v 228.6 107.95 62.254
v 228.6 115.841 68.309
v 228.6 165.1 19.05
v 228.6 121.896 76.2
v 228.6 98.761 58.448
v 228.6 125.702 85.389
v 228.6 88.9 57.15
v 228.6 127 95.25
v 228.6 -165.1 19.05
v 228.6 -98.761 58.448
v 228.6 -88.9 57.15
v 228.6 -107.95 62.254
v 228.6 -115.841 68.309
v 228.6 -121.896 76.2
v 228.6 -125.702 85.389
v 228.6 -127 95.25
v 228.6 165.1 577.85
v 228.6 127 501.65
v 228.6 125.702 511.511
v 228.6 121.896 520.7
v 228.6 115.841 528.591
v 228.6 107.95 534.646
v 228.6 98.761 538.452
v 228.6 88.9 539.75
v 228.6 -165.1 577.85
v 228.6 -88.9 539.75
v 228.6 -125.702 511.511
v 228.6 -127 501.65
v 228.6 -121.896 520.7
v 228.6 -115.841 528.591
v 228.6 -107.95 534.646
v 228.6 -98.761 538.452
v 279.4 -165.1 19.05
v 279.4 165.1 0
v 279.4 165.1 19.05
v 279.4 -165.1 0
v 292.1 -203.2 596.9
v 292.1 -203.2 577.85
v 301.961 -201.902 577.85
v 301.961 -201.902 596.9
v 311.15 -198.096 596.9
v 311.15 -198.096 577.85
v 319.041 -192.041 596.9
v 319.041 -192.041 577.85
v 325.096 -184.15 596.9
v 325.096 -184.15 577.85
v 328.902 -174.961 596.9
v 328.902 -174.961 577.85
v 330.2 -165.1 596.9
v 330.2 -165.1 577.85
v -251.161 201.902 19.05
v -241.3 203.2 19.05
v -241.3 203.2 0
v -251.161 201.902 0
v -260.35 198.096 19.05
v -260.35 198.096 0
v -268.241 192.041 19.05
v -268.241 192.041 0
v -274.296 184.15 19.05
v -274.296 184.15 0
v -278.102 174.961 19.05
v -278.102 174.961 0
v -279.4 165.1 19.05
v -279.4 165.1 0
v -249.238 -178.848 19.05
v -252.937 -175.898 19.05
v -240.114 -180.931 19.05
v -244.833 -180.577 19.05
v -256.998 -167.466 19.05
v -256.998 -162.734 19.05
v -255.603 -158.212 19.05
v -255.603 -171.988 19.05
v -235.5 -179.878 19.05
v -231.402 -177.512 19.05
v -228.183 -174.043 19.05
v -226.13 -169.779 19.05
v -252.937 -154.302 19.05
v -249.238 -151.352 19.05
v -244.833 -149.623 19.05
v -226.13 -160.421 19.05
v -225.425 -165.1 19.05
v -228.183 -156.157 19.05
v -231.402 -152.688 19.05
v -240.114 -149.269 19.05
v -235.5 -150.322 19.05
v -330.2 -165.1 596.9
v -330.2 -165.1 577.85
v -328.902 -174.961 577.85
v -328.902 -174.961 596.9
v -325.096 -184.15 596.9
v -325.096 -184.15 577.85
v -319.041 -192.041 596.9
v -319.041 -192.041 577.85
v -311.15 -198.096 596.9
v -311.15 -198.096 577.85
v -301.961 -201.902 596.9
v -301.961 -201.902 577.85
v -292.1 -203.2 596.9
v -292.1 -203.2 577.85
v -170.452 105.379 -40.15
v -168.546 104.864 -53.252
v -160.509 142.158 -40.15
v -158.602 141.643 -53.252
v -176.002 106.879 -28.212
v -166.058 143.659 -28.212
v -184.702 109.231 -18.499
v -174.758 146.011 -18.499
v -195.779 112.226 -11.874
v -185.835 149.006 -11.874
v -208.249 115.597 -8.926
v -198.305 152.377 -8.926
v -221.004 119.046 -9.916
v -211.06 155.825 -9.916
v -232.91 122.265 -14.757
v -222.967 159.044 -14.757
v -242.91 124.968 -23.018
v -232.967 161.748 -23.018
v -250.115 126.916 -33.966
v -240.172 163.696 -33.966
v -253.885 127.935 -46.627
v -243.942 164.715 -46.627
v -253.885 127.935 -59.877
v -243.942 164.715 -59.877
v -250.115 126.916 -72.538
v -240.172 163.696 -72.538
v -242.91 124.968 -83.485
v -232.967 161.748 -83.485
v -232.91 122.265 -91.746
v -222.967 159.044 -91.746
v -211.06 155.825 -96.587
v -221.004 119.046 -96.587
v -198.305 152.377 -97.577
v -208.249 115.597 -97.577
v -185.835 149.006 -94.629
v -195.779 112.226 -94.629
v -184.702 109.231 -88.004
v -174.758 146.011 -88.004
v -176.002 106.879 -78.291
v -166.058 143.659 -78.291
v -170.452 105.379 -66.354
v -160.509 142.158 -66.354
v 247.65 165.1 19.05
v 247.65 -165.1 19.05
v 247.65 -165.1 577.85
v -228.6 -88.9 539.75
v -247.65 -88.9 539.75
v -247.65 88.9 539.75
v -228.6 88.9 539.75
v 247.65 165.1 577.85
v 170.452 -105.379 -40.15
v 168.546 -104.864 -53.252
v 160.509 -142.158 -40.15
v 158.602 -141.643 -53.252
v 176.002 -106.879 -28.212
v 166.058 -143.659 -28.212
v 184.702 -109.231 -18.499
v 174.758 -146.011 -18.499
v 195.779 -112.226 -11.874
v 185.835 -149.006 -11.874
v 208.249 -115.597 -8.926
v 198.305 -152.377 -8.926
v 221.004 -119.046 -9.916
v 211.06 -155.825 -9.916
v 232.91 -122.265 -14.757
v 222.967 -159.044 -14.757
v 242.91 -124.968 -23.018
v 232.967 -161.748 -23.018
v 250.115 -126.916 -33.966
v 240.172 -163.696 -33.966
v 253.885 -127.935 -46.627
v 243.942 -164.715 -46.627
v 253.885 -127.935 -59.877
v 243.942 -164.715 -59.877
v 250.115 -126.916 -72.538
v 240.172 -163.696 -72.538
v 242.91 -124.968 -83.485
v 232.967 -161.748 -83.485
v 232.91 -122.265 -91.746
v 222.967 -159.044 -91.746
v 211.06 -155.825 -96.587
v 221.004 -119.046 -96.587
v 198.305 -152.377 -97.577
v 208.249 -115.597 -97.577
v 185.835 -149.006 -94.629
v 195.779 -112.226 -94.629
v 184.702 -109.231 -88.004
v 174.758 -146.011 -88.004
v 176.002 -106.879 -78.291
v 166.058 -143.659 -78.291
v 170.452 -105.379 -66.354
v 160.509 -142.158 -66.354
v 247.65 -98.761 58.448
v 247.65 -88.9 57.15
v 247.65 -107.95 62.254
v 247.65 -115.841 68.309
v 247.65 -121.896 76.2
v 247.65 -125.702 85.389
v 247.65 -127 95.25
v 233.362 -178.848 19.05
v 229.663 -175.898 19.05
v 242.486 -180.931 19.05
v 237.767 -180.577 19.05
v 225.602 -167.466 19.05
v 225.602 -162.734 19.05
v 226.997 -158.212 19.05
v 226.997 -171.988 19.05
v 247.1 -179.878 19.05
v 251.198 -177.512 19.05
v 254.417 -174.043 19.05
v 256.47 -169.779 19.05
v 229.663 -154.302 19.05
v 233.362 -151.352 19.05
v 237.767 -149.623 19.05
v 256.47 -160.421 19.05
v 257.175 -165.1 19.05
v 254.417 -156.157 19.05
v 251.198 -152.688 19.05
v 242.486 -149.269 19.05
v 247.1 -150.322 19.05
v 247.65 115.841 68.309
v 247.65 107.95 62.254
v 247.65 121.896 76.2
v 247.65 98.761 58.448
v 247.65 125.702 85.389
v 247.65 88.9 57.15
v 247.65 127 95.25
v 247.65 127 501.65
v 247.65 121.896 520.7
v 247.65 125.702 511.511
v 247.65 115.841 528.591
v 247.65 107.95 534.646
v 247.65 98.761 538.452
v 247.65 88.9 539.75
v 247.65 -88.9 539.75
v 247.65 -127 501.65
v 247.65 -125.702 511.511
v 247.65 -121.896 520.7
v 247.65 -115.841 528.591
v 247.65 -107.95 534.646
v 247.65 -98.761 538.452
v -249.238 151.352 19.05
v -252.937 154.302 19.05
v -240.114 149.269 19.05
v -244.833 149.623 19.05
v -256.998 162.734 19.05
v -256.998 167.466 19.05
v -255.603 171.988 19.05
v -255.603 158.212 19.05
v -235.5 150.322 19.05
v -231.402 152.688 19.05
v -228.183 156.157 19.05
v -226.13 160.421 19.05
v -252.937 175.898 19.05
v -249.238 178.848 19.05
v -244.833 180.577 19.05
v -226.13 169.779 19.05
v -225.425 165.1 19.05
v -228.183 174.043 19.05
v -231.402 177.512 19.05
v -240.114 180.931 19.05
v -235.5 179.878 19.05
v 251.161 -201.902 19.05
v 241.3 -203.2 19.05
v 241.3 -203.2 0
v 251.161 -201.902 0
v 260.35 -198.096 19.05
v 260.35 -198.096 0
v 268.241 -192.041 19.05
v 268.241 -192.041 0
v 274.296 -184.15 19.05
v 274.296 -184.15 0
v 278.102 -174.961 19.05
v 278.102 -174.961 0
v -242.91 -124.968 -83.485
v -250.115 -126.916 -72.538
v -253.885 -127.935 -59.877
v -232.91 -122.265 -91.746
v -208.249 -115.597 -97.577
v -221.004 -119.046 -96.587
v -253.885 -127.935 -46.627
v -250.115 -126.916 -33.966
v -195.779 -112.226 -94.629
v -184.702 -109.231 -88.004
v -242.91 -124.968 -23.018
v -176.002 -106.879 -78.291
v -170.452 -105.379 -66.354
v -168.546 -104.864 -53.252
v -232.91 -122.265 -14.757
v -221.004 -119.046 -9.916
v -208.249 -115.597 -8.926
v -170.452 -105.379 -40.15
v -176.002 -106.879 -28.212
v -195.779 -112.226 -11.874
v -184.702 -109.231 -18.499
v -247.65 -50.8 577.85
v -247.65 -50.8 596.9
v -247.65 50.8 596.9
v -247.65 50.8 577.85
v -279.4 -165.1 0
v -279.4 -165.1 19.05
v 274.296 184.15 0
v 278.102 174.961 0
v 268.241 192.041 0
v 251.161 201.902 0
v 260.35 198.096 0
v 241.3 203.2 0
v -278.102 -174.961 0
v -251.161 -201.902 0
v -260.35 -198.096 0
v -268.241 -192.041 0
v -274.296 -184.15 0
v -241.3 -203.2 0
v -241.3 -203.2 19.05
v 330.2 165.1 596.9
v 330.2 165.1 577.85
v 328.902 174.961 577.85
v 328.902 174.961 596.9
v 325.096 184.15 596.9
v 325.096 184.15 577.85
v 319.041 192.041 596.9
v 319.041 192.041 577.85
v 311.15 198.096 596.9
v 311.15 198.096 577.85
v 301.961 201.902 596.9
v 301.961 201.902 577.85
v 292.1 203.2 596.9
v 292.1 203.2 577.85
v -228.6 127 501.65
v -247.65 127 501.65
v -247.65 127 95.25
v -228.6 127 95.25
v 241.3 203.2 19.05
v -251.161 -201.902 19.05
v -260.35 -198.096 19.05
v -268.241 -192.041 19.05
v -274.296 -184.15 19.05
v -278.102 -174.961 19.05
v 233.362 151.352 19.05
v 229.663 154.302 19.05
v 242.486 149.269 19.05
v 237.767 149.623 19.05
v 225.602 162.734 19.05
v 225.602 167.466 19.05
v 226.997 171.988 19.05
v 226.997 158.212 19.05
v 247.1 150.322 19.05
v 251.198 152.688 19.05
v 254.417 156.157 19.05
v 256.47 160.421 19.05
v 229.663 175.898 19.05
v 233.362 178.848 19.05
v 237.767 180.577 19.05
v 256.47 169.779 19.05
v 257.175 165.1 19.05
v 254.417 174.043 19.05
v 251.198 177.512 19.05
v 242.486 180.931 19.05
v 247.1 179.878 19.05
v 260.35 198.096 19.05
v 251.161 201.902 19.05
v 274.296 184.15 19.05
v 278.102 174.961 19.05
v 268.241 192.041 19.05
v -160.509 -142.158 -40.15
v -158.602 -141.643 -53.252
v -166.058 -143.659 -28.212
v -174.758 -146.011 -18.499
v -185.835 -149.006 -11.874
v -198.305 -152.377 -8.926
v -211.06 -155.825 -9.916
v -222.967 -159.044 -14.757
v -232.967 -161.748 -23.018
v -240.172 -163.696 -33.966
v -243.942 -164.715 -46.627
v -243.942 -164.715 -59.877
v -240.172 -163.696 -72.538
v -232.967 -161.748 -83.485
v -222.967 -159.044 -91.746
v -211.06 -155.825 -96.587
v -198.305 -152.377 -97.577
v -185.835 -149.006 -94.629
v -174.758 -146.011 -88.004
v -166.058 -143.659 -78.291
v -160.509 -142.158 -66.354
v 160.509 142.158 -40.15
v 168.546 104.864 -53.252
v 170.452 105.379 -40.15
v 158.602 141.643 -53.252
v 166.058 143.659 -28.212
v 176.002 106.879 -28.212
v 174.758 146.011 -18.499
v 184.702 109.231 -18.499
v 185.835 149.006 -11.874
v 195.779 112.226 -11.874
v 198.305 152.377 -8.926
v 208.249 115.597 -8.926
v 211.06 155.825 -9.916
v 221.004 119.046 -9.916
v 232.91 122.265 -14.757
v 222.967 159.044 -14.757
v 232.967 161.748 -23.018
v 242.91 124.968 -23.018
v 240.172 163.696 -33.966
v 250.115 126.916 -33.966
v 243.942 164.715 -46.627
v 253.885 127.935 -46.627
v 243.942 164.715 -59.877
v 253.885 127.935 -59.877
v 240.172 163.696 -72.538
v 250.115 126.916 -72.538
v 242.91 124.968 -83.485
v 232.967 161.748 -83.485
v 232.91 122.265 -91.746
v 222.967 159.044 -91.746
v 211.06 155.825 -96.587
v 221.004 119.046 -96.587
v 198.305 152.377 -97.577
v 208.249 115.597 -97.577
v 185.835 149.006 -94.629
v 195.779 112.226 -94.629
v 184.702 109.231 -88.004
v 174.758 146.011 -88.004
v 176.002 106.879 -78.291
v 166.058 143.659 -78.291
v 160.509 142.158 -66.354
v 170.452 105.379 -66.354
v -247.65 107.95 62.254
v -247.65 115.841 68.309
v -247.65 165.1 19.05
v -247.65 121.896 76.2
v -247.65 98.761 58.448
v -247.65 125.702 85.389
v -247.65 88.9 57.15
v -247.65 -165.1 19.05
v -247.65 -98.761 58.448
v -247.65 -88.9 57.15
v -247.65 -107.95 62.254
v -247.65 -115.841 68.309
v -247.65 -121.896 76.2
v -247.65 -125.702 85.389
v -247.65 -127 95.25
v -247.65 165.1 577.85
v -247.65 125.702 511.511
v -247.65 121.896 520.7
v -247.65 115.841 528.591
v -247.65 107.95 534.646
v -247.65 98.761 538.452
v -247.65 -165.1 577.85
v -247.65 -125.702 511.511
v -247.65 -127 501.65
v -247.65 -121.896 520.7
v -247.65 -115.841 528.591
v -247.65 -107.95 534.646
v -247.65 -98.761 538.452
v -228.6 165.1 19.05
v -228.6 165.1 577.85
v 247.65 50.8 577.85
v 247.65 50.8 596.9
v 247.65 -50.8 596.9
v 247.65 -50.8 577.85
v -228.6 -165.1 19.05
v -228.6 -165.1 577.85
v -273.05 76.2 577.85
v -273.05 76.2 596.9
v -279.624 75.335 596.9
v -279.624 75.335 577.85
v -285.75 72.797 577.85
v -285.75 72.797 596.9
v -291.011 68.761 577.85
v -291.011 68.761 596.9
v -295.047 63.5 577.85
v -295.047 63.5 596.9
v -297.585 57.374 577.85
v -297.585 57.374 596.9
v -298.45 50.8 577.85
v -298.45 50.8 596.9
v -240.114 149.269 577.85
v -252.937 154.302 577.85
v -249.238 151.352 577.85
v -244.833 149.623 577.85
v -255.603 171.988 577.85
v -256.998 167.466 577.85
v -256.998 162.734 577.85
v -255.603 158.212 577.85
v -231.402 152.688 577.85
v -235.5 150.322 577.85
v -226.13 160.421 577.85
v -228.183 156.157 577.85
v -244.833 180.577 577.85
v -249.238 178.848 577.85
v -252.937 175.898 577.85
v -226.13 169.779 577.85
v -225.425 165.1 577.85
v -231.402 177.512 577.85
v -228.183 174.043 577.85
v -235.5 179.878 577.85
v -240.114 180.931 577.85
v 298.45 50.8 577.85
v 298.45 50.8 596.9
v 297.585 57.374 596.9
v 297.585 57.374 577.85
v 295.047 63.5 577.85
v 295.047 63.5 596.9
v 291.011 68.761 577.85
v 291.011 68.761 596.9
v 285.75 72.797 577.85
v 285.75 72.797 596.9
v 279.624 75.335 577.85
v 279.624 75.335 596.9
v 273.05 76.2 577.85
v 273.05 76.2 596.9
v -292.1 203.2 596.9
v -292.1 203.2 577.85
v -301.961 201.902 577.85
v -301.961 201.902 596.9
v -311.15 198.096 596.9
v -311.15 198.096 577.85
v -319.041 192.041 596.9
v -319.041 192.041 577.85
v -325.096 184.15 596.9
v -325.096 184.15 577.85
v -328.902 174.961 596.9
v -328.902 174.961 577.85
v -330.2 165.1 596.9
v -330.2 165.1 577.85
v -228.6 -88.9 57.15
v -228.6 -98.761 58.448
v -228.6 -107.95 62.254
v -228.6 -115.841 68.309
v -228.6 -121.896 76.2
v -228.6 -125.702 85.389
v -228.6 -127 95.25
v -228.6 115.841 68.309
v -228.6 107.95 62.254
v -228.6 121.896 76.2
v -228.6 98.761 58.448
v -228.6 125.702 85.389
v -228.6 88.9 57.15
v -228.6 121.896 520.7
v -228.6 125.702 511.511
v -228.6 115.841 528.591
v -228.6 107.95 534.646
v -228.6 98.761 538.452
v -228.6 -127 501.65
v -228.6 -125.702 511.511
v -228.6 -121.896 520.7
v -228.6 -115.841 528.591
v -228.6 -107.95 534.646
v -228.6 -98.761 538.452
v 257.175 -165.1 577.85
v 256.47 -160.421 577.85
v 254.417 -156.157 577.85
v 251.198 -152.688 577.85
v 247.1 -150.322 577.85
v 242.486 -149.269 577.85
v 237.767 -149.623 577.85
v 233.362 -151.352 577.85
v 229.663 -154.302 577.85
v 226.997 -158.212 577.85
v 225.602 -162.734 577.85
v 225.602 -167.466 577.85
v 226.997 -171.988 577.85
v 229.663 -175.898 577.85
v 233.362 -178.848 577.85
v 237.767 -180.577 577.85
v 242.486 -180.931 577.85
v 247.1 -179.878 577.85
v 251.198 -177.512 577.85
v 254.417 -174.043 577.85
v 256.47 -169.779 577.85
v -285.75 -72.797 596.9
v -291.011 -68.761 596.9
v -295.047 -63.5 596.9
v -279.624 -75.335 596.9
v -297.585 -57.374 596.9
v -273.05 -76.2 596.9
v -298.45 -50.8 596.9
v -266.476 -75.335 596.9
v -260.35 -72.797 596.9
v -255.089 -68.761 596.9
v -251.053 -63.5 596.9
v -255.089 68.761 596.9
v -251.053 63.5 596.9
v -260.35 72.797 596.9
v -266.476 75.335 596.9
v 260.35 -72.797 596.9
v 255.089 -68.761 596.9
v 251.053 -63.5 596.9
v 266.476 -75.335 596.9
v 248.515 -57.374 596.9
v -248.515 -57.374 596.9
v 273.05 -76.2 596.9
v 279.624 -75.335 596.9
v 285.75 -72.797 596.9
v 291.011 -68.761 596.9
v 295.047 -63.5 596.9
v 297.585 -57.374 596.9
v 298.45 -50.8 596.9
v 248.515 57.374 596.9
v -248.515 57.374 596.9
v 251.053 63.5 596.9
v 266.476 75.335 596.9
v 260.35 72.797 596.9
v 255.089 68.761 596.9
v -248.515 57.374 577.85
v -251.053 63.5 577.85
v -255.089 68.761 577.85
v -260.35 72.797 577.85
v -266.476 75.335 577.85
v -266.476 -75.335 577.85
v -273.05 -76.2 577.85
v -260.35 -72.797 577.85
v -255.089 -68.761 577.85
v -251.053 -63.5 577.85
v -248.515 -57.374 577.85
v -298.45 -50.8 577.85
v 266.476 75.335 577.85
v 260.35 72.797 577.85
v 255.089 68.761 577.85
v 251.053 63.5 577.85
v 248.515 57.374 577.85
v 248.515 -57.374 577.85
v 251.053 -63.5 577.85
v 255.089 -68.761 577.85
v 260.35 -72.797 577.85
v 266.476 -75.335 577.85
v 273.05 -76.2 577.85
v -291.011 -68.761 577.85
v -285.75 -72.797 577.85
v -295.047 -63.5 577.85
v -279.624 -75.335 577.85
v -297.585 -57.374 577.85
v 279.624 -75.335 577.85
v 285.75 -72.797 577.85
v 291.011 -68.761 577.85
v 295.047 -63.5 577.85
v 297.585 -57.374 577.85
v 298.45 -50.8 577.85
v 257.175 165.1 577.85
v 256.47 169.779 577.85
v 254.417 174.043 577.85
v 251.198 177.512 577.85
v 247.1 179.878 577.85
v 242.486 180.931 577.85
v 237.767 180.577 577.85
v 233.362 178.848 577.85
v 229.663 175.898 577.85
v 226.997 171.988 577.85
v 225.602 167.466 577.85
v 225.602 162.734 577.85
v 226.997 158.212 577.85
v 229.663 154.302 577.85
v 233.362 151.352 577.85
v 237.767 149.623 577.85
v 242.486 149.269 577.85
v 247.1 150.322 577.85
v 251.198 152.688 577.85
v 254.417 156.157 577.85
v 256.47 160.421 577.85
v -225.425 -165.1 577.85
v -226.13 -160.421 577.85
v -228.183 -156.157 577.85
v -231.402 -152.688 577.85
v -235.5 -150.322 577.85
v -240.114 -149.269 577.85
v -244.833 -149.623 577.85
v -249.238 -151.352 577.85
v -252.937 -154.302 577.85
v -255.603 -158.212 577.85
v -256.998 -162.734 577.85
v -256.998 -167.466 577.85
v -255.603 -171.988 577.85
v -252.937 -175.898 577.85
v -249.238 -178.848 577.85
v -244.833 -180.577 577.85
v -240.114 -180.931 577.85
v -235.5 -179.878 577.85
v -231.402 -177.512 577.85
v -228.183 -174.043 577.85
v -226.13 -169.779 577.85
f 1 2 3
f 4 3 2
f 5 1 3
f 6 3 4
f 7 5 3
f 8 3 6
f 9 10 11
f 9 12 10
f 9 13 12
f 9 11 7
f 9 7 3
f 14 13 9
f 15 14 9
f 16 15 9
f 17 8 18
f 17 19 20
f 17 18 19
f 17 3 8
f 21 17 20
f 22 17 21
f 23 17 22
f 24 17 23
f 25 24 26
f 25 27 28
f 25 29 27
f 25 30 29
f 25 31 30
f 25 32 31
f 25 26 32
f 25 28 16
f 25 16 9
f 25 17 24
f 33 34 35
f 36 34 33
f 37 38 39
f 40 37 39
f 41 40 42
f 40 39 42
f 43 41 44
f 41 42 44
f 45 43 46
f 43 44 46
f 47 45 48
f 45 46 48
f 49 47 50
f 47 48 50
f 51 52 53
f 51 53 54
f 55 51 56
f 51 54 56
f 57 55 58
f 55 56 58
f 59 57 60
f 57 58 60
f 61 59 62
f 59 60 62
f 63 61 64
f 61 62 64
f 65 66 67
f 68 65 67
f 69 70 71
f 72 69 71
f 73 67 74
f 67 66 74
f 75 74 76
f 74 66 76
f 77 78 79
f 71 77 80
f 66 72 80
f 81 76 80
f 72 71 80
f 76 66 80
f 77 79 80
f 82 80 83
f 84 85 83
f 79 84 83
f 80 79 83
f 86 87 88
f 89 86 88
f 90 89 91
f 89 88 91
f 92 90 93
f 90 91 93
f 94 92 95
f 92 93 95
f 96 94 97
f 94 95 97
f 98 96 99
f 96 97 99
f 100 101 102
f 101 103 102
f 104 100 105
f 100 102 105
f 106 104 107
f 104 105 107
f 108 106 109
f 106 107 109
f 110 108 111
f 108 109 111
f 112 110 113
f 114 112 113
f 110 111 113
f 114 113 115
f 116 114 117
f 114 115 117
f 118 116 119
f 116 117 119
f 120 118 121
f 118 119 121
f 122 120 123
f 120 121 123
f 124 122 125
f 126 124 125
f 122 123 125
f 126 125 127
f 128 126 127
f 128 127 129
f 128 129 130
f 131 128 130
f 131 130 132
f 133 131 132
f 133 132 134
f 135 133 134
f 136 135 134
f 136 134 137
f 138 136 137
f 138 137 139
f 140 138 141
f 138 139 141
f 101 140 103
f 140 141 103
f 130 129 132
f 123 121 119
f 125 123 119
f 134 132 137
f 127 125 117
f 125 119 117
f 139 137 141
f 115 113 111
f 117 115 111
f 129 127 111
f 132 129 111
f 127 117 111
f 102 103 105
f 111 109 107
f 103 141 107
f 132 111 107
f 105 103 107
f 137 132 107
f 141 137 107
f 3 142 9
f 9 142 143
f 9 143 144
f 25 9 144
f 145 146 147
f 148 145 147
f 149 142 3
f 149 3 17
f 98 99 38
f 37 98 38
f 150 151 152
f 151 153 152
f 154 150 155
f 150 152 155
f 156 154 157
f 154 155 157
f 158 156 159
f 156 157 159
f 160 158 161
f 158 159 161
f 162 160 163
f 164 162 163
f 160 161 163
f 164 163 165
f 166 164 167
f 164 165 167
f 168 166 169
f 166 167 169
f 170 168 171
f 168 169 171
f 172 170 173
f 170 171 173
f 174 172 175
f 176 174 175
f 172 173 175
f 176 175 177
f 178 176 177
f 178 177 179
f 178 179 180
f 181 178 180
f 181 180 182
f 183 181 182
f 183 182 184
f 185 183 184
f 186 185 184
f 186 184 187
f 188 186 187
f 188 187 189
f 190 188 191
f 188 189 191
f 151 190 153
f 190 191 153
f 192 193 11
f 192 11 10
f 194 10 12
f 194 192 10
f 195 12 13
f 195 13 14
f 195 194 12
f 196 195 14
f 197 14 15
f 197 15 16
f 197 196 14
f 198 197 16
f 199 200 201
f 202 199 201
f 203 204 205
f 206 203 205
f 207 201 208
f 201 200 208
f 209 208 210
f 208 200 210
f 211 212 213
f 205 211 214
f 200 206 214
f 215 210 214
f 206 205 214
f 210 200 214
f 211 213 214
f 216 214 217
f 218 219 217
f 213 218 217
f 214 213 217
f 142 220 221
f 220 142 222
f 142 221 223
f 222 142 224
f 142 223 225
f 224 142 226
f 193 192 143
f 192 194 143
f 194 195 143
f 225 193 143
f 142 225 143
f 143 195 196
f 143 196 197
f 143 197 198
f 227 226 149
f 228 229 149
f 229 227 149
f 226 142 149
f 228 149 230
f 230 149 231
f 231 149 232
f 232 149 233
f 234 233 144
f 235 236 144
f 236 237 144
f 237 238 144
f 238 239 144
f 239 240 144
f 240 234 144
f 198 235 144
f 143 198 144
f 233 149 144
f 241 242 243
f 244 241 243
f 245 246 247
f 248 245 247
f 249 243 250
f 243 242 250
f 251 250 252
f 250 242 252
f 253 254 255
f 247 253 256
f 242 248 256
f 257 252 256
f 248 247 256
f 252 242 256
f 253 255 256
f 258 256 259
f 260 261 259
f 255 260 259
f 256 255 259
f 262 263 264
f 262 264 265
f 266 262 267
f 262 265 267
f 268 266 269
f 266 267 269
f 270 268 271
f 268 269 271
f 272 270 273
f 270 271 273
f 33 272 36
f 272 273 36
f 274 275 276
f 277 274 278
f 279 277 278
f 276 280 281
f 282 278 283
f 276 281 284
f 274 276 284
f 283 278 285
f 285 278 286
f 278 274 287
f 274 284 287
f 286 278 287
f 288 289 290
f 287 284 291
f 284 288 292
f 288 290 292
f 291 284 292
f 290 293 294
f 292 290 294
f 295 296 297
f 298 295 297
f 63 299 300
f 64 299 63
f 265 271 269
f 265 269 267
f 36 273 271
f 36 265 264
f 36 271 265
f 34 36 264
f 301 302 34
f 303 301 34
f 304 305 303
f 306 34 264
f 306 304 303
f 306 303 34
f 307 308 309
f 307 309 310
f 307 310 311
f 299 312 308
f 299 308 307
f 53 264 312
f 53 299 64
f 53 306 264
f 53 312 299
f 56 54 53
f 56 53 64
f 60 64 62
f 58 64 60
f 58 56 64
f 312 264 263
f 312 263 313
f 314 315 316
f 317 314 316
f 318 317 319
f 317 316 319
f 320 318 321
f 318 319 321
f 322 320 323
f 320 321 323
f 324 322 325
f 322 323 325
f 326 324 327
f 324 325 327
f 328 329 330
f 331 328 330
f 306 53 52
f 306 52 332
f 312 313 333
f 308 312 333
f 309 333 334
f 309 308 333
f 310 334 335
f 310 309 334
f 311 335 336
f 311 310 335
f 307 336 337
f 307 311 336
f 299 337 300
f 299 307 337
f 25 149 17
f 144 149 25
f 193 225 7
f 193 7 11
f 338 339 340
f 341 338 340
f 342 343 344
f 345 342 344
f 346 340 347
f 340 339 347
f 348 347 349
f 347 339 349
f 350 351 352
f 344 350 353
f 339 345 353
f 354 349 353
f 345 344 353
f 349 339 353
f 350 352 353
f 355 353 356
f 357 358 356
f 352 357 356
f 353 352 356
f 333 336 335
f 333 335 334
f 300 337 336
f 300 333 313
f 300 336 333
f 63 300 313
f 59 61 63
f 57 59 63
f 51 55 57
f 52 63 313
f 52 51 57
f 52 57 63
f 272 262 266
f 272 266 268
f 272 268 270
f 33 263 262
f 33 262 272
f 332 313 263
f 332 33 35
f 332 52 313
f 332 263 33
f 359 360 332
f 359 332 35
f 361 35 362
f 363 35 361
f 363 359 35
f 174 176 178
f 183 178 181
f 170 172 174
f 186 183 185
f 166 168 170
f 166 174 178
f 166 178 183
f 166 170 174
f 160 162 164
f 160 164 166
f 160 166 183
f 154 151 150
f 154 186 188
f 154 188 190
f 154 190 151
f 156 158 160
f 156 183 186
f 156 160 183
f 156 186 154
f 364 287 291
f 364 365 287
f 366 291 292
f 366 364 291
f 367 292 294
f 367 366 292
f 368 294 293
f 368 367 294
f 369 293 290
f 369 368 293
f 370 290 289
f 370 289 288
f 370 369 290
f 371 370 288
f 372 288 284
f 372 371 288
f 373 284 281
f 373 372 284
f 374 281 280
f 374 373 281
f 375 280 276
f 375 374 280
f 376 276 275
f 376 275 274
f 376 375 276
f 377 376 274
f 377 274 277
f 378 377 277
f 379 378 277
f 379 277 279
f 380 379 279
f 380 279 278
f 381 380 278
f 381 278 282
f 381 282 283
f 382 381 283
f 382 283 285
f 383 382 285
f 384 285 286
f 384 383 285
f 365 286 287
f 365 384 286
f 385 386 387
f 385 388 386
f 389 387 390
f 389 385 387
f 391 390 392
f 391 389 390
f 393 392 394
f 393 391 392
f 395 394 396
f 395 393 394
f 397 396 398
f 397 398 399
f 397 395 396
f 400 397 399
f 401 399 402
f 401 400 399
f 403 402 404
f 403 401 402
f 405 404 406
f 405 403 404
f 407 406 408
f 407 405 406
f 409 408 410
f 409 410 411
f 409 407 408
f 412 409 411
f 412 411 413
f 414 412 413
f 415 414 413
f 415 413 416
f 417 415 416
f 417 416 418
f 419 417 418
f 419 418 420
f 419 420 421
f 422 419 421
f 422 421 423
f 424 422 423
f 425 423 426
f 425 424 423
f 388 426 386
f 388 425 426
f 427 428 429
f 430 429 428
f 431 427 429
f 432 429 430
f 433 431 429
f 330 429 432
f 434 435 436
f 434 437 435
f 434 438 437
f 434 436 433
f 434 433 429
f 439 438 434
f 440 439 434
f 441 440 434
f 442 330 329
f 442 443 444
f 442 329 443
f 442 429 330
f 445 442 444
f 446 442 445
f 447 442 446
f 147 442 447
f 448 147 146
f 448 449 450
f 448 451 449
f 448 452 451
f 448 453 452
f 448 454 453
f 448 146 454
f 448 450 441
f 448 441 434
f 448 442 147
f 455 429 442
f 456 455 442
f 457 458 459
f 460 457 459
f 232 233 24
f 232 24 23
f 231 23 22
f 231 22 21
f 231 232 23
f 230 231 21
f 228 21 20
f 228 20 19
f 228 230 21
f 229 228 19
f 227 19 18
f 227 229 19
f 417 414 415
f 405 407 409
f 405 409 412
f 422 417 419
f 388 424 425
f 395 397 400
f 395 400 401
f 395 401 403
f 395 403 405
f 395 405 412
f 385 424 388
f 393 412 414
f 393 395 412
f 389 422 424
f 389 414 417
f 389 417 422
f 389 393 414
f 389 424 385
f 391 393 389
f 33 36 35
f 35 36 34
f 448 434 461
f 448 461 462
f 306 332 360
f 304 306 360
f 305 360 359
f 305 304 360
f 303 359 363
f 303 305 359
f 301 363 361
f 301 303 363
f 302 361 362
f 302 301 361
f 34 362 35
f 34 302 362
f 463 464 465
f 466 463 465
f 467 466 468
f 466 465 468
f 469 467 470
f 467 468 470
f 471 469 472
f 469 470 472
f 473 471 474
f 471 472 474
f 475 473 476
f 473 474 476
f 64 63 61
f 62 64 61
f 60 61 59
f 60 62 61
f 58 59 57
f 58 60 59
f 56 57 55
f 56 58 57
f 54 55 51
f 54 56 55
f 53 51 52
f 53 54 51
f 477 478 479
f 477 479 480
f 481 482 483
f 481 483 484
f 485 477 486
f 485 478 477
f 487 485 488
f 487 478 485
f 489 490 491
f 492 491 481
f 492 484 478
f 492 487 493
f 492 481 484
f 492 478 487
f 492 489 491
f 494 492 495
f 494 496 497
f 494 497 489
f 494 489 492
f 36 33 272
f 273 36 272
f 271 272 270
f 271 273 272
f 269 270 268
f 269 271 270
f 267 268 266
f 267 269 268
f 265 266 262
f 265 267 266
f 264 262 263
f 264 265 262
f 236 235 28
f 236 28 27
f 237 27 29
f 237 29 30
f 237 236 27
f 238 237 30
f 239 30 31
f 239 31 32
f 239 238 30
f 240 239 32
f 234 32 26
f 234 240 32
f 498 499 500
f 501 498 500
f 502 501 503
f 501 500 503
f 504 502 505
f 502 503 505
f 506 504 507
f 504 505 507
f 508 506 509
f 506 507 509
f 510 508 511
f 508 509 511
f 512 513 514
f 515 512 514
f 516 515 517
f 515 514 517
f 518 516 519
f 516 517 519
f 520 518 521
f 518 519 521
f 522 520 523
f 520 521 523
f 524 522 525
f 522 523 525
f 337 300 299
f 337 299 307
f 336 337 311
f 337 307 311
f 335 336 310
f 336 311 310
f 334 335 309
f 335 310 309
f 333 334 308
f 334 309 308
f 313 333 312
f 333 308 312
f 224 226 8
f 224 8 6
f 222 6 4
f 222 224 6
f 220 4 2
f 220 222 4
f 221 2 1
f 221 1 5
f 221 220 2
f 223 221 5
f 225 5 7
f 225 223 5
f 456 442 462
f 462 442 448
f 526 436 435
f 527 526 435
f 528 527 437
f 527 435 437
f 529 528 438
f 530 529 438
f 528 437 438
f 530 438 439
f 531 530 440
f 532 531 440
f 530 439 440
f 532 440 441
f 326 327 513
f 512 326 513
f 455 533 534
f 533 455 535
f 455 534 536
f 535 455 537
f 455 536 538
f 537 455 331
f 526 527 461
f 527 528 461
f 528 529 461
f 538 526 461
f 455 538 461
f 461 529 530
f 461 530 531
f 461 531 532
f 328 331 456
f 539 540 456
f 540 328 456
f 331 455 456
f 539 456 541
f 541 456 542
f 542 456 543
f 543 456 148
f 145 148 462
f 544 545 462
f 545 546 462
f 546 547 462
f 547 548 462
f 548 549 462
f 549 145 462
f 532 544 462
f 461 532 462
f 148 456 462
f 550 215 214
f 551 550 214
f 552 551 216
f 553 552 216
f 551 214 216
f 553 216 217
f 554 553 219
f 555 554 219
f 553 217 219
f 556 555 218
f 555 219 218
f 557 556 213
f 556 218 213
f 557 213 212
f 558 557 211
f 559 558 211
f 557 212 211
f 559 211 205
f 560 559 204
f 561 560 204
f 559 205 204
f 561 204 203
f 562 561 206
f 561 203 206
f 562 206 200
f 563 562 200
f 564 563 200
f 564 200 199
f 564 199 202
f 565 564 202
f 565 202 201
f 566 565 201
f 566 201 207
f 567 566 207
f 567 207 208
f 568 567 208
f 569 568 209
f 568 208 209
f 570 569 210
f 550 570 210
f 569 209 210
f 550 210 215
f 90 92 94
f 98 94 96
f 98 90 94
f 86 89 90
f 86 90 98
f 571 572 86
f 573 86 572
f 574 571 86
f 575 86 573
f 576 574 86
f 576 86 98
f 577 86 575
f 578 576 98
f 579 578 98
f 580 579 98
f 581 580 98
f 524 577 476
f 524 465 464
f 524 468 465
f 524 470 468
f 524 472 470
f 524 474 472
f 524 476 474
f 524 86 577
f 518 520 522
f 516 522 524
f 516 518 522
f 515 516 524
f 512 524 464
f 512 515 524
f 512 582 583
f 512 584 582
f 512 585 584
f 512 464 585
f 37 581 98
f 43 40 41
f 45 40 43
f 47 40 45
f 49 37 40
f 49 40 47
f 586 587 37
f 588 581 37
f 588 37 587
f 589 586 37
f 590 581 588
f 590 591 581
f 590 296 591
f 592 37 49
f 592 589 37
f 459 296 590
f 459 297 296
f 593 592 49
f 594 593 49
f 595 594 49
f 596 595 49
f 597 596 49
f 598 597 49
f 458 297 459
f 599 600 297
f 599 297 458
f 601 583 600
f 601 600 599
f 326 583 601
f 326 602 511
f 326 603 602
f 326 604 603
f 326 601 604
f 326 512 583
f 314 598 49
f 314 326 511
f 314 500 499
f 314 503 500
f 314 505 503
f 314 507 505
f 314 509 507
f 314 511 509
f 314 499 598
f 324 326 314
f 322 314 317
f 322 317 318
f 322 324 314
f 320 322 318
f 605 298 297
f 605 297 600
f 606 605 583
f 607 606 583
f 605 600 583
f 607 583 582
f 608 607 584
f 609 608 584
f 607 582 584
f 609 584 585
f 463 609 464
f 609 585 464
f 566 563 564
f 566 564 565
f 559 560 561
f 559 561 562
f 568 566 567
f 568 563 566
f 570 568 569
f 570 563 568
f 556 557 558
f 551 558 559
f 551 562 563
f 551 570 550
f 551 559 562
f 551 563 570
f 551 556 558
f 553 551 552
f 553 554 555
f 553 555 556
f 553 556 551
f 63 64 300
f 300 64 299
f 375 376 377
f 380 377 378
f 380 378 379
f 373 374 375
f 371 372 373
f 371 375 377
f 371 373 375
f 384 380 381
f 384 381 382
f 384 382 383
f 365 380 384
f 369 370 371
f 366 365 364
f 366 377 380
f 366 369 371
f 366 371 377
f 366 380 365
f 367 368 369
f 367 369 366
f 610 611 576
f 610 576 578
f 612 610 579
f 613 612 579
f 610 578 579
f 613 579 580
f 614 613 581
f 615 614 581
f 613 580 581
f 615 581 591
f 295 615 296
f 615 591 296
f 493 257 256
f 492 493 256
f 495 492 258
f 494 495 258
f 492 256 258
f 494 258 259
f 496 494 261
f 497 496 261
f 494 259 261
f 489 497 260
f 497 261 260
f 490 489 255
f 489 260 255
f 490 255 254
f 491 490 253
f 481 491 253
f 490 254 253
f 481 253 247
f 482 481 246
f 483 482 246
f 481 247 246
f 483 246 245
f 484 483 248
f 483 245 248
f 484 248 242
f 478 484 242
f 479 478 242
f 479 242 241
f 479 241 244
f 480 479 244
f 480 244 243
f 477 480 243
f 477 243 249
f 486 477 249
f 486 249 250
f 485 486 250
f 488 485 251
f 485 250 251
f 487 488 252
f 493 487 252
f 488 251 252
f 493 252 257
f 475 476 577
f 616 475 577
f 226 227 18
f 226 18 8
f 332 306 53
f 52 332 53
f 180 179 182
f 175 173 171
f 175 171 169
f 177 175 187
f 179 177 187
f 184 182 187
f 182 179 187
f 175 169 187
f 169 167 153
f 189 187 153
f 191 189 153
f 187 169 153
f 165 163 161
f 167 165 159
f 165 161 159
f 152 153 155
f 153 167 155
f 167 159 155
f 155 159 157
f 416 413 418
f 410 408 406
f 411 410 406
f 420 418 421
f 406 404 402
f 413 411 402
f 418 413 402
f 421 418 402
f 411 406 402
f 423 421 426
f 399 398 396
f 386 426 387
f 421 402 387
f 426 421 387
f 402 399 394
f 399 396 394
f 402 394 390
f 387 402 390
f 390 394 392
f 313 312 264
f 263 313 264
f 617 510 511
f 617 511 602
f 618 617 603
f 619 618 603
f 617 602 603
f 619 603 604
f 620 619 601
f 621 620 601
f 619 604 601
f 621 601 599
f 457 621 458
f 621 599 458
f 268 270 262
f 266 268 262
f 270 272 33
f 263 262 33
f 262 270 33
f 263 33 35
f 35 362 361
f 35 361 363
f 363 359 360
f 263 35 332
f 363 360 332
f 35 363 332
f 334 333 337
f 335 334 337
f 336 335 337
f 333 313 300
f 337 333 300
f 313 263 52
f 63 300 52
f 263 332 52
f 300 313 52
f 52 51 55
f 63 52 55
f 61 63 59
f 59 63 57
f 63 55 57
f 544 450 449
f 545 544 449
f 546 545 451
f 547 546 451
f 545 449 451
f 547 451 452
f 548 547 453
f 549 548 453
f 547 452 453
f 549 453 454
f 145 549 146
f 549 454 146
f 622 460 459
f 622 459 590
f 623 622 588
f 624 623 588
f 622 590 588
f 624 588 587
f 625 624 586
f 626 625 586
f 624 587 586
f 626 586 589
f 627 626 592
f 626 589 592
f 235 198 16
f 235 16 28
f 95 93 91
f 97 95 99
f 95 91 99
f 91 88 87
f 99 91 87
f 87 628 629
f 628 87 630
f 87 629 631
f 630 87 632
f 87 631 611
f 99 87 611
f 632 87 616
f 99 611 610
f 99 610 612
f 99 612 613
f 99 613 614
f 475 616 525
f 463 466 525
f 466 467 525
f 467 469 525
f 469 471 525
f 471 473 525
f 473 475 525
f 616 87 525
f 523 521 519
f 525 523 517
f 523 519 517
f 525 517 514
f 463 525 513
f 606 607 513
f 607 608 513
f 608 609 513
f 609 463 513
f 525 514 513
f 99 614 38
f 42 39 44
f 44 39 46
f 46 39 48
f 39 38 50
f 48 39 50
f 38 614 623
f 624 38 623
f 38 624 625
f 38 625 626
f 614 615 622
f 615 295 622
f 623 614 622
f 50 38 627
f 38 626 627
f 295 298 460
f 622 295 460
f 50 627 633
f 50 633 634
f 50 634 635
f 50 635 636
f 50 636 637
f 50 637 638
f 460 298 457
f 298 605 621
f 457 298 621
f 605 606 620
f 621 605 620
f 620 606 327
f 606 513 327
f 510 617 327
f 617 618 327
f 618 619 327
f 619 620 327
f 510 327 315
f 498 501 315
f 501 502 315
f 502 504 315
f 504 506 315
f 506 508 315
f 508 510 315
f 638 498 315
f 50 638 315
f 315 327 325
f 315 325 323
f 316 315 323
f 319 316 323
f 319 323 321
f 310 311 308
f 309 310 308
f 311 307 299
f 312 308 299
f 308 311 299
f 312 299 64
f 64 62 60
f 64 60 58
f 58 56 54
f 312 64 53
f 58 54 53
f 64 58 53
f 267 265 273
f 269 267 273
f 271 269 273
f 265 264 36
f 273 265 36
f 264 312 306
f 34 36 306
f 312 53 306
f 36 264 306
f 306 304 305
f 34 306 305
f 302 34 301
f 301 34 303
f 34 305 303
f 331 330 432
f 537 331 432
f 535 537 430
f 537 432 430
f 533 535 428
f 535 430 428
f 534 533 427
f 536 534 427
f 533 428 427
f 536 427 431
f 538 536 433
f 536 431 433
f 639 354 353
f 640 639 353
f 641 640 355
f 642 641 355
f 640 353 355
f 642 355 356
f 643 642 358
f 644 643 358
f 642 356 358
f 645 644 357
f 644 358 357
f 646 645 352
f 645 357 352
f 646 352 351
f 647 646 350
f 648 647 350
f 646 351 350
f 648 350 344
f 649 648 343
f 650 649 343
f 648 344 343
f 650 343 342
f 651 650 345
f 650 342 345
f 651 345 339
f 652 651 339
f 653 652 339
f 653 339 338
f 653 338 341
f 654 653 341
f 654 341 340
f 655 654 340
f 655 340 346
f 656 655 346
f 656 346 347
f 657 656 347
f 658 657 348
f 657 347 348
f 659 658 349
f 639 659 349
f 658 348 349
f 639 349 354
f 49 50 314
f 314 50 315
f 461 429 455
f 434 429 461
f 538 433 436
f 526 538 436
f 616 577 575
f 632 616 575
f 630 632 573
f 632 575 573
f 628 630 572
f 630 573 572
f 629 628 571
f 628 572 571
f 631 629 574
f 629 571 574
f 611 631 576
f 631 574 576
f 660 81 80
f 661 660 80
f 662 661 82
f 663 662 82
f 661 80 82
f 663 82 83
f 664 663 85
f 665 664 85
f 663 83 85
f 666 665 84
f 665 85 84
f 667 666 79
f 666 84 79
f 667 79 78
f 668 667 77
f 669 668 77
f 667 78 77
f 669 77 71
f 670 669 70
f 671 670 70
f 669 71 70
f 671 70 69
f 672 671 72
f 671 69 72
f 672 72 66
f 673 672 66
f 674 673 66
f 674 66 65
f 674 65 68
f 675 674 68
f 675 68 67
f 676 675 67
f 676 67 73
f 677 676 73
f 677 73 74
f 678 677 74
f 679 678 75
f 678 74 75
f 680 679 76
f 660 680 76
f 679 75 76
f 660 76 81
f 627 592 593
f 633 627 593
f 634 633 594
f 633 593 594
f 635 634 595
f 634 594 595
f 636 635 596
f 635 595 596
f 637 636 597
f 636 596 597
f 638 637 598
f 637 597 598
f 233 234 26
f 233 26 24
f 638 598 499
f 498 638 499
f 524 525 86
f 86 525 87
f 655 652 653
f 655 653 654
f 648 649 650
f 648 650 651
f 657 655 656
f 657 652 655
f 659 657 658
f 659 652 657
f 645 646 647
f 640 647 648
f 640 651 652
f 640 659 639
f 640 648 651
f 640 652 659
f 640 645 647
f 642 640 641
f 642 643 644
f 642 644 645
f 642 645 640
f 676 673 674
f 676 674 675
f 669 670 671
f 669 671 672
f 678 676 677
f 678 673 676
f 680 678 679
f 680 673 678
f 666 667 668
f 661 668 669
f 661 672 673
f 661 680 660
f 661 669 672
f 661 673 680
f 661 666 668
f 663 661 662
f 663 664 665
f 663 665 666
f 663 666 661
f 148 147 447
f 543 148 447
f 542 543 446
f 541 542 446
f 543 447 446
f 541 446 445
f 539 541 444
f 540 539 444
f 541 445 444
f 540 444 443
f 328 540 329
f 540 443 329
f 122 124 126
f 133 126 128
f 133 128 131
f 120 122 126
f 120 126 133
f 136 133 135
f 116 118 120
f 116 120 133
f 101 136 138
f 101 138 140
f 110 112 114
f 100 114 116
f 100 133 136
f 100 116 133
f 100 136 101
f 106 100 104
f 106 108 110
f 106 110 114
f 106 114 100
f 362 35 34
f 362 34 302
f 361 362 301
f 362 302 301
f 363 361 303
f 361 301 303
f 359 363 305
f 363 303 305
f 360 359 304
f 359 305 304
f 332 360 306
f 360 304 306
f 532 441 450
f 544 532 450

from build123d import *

# Parameters (mm, degrees)
F1_DEPTH  = 19.05
F5_W      = 330.2
F5_H      = 558.8
F6_DEPTH  = 19.05
F8_DEPTH  = 527.051
F10_W     = 19.05
F10_H     = 330.2
F11_DEPTH = 19.05
F13_DEPTH = 25.4
F14_R     = 15.875
F15_DEPTH = 558.8
F18_R     = 44.45
F19_DEPTH = 19.05


with BuildPart() as f1:
    # F0 (on Top) → F1 (new body)
    with BuildSketch(Plane.XY):
        with BuildLine():
            Line((-241.3, -203.2), (241.3, -203.2))
            ThreePointArc((241.3, -203.2), (268.240768, -192.040768), (279.4, -165.1))
            Line((279.4, -165.1), (279.4, 165.1))
            ThreePointArc((279.4, 165.1), (268.240768, 192.040768), (241.3, 203.2))
            Line((241.3, 203.2), (-241.3, 203.2))
            ThreePointArc((-241.3, 203.2), (-268.240768, 192.040768), (-279.4, 165.1))
            Line((-279.4, 165.1), (-279.4, -165.1))
            ThreePointArc((-279.4, -165.1), (-268.240768, -192.040768), (-241.3, -203.2))
        make_face()
    extrude(amount=F1_DEPTH)


with BuildPart() as f6:
    # F5 (on face) → F6 (new body)
    with BuildSketch(Plane(origin=(-247.65, 0, 0), x_dir=(0, -1, 0), z_dir=(-1, 0, 0))):
        with Locations((0, 298.45)):
            Rectangle(F5_W, F5_H)
    extrude(amount=-F6_DEPTH)

    # F7 (on face) → F8 (cut, through all)
    with BuildSketch(Plane(origin=(-247.65, 0, 0), x_dir=(0, -1, 0), z_dir=(-1, 0, 0))):
        with BuildLine():
            Line((88.9, 539.75), (-88.9, 539.75))
            ThreePointArc((-88.9, 539.75), (-115.840768, 528.590768), (-127, 501.65))
            Line((-127, 501.65), (-127, 95.25))
            ThreePointArc((-127, 95.25), (-115.840768, 68.309232), (-88.9, 57.15))
            Line((-88.9, 57.15), (88.9, 57.15))
            ThreePointArc((88.9, 57.15), (115.840768, 68.309232), (127, 95.25))
            Line((127, 95.25), (127, 501.65))
            ThreePointArc((127, 501.65), (115.840768, 528.590768), (88.9, 539.75))
        make_face()
    extrude(amount=-F8_DEPTH, mode=Mode.SUBTRACT)


with BuildPart() as f9_1:
    # F9: instance of F1
    add(f1.part.mirror(Plane.YZ))


with BuildPart() as f9_2:
    # F9: instance of F6
    add(f6.part.mirror(Plane.YZ))


with BuildPart() as f11:
    # F10 (on face) → F11 (new body)
    with BuildSketch(Plane.XY.offset(577.85)):
        with BuildLine():
            ThreePointArc((-330.2, -165.1), (-319.040768, -192.040768), (-292.1, -203.2))
            Line((-292.1, -203.2), (292.1, -203.2))
            ThreePointArc((292.1, -203.2), (319.040768, -192.040768), (330.2, -165.1))
            Line((330.2, -165.1), (330.2, 165.1))
            ThreePointArc((330.2, 165.1), (319.040768, 192.040768), (292.1, 203.2))
            Line((292.1, 203.2), (-292.1, 203.2))
            ThreePointArc((-292.1, 203.2), (-319.040768, 192.040768), (-330.2, 165.1))
            Line((-330.2, 165.1), (-330.2, -165.1))
        make_face()
        with Locations((-238.125, 0)):
            Rectangle(F10_W, F10_H, mode=Mode.SUBTRACT)
        with Locations((-238.125, 0)):
            Rectangle(F10_W, F10_H)
    extrude(amount=F11_DEPTH)

    # F12 (on face) → F13 (cut)
    with BuildSketch(Plane.XY.offset(596.9)):
        with BuildLine():
            ThreePointArc((-273.05, -76.2), (-255.089488, -68.760512), (-247.65, -50.8))
            Line((-247.65, -50.8), (-247.65, 50.8))
            ThreePointArc((-247.65, 50.8), (-255.089488, 68.760512), (-273.05, 76.2))
            ThreePointArc((-273.05, 76.2), (-291.010512, 68.760512), (-298.45, 50.8))
            Line((-298.45, 50.8), (-298.45, -50.8))
            ThreePointArc((-298.45, -50.8), (-291.010512, -68.760512), (-273.05, -76.2))
        make_face()
        with BuildLine():
            ThreePointArc((247.65, -50.8), (255.089488, -68.760512), (273.05, -76.2))
            ThreePointArc((273.05, -76.2), (291.010512, -68.760512), (298.45, -50.8))
            Line((298.45, -50.8), (298.45, 50.8))
            ThreePointArc((298.45, 50.8), (291.010512, 68.760512), (273.05, 76.2))
            ThreePointArc((273.05, 76.2), (255.089488, 68.760512), (247.65, 50.8))
            Line((247.65, 50.8), (247.65, -50.8))
        make_face()
    extrude(amount=-F13_DEPTH, mode=Mode.SUBTRACT)


with BuildPart() as f15:
    # F14 (on face) → F15 (new body)
    with BuildSketch(Plane.XY.offset(19.05)):
        with Locations((-241.3, -165.1)):
            Circle(F14_R)
        with Locations((241.3, -165.1)):
            Circle(F14_R)
        with Locations((-241.3, 165.1)):
            Circle(F14_R)
        with Locations((241.3, 165.1)):
            Circle(F14_R)
    extrude(amount=F15_DEPTH)


with BuildPart() as f19:
    # F18 (on face) → F19 (new body, symmetric)
    with BuildSketch(Plane(origin=(19.910852, -73.647704, 0), x_dir=(0.965343, 0.260983, 0), z_dir=(0.260983, -0.965343, 0))):
        with Locations((-234.522119, -53.251639)):
            Circle(F18_R)
    extrude(amount=F19_DEPTH, both=True)


with BuildPart() as f20_1:
    # F20: instance of F19
    add(f19.part.mirror(Plane.YZ))


with BuildPart() as f21_1:
    # F21: instance of F19
    add(f19.part.mirror(Plane.XZ))


with BuildPart() as f21_2:
    # F21: instance of F20_1
    add(f20_1.part.mirror(Plane.XZ))


solid = Compound([f1.part, f6.part, f9_1.part, f9_2.part, f11.part, f15.part, f19.part, f20_1.part, f21_1.part, f21_2.part])
